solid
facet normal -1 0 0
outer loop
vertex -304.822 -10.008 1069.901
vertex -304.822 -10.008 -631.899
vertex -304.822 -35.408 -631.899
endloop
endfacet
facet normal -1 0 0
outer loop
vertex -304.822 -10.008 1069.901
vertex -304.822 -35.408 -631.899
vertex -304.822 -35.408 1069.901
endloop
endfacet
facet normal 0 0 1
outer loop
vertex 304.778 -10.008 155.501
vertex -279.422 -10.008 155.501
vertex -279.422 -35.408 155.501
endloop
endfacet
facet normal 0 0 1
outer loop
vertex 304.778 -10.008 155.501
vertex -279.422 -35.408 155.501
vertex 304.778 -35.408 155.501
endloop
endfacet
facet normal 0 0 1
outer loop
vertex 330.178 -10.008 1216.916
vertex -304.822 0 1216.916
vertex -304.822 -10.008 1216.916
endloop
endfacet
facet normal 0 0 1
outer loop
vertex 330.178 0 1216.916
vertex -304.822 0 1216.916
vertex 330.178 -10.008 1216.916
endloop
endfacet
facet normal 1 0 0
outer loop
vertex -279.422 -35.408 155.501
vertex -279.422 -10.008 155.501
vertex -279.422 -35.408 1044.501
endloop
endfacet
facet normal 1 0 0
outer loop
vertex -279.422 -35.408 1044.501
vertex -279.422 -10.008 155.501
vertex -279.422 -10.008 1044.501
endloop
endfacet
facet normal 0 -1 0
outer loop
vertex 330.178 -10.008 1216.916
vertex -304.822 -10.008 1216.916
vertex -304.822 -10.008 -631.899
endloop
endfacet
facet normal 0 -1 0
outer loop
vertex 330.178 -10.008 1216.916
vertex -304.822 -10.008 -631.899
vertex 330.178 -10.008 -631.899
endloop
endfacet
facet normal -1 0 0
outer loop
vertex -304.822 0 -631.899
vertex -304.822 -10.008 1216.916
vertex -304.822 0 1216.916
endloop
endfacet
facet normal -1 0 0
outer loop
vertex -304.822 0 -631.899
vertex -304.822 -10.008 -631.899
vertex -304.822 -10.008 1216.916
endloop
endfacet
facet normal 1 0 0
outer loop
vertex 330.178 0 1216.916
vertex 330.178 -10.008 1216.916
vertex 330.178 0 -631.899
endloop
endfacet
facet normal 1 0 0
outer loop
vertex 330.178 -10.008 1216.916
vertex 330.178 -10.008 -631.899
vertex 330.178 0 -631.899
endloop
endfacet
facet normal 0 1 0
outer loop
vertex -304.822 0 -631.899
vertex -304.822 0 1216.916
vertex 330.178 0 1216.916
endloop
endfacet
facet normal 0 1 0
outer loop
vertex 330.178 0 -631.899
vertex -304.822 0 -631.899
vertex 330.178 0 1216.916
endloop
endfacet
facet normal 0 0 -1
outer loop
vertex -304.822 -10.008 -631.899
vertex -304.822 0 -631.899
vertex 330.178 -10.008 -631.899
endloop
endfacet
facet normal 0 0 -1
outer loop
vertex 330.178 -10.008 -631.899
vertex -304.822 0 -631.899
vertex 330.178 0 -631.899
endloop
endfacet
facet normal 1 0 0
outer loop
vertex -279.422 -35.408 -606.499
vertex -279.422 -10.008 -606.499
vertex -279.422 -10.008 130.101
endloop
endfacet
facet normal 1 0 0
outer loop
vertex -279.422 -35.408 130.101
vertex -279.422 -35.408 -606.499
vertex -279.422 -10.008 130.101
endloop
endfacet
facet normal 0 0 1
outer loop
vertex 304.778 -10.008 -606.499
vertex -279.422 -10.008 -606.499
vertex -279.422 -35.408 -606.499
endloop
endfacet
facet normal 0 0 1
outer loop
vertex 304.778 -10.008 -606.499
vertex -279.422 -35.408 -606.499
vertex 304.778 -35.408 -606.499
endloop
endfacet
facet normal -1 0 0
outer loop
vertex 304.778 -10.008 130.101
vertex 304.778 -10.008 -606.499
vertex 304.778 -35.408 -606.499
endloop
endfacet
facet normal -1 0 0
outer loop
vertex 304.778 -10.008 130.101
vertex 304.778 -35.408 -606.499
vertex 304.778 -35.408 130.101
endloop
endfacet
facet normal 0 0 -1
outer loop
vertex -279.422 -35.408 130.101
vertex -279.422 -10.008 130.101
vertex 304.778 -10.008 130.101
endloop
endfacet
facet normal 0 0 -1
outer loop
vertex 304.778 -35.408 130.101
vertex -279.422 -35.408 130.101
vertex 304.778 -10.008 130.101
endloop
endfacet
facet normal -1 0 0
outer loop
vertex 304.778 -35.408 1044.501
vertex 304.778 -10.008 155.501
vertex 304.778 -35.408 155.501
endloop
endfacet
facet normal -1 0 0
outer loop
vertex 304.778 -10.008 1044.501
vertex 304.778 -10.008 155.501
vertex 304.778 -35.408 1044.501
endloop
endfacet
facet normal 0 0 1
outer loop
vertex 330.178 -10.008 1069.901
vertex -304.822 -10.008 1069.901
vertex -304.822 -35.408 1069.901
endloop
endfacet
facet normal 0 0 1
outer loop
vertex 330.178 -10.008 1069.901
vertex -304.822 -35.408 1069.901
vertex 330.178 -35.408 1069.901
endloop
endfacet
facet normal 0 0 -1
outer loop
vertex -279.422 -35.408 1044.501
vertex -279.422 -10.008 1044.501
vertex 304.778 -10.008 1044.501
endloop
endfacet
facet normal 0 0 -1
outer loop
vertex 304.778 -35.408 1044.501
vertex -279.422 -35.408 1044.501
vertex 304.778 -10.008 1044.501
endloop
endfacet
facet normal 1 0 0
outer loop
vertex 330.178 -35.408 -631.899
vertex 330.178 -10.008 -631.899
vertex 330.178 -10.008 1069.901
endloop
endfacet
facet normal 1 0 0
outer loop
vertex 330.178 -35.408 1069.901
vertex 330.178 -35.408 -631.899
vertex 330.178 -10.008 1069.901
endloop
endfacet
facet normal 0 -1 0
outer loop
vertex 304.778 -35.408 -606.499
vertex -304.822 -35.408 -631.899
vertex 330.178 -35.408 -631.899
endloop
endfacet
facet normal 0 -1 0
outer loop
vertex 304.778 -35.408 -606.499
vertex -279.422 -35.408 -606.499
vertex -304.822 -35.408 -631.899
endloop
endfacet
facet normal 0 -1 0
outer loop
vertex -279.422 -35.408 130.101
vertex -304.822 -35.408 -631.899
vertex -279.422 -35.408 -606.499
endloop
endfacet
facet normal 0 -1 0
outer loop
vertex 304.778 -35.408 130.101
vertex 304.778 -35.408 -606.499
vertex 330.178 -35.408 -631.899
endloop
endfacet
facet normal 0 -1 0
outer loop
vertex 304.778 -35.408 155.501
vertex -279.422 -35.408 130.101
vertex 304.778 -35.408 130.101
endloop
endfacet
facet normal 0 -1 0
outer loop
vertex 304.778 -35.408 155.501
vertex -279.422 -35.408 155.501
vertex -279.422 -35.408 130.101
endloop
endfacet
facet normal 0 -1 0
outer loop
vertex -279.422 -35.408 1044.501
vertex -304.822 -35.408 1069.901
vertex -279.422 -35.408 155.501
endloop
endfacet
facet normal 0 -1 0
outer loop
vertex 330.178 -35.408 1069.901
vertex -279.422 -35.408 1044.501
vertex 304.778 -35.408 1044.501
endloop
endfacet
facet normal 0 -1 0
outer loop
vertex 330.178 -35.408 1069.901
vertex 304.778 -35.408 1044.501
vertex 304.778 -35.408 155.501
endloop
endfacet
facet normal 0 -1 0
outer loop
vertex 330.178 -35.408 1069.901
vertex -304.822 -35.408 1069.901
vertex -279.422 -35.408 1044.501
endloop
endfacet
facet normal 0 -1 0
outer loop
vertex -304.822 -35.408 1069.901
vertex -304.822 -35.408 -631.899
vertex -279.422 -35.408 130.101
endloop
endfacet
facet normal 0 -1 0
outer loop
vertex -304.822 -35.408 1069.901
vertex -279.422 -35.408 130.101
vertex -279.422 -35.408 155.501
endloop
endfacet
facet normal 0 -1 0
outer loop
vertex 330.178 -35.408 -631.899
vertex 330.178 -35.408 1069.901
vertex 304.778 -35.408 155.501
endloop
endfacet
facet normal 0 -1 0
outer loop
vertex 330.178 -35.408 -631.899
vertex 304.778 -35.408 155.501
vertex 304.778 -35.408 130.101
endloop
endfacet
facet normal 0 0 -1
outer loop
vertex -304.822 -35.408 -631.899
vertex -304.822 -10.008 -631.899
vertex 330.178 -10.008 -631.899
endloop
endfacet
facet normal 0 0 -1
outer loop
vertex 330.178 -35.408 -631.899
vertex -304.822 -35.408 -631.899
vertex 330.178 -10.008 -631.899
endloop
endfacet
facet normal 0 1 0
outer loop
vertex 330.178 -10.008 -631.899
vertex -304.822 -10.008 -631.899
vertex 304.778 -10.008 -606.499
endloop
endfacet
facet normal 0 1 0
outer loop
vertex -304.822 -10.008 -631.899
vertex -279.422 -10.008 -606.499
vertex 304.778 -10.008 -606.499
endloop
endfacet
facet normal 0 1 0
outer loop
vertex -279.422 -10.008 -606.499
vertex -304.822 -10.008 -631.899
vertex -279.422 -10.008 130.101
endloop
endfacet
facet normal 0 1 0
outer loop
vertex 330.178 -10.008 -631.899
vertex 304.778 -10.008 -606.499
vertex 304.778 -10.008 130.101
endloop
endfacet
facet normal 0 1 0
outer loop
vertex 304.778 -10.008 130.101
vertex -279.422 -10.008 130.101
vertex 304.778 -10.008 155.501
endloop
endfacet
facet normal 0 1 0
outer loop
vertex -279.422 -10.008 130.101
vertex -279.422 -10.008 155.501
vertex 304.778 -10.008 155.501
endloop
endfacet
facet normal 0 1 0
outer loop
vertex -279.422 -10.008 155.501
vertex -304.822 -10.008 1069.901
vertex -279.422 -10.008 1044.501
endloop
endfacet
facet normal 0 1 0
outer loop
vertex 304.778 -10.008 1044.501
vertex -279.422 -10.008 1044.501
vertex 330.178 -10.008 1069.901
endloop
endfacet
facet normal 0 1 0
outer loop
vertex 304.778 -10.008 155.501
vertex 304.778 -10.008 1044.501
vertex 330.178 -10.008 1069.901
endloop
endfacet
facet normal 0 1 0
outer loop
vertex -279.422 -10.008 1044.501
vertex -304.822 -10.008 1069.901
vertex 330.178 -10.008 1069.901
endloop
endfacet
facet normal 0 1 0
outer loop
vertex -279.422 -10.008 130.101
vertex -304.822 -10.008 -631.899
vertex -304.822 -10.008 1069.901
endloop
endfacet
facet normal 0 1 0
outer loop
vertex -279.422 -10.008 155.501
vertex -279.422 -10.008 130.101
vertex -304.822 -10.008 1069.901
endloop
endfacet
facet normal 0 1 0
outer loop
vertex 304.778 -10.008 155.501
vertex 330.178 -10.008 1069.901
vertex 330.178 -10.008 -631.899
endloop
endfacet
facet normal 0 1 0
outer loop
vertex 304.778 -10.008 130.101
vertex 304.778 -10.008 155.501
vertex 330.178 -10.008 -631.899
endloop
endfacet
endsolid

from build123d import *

# Parameters (mm, degrees)
F0_W     = 635
F0_H     = 1701.8
F1_DEPTH = 10.0076
F2_W     = 635
F2_H     = 1701.8
F2_W_2   = 584.2
F2_H_2   = 736.6
F2_H_3   = 889
F3_DEPTH = 25.4
F4_W     = 635
F4_H     = 10.0076
F5_DEPTH = 147.0152


with BuildPart() as f1:
    # F0 (on Front) → F1 (new body)
    with BuildSketch(Plane.XZ):
        with Locations((12.6779675484, 219.000581247)):
            Rectangle(F0_W, F0_H)
    extrude(amount=F1_DEPTH)

    # F4 (on face) → F5 (join)
    with BuildSketch(Plane.XY.offset(1069.900581247)):
        with Locations((12.6779675484, -5.0038)):
            Rectangle(F4_W, F4_H)
    extrude(amount=F5_DEPTH)


with BuildPart() as f3:
    # F2 (on face) → F3 (new body)
    with BuildSketch(Plane.XZ.offset(10.0076)):
        with Locations((12.6779675484, 219.000581247)):
            Rectangle(F2_W, F2_H)
        with Locations((12.6779675484, -238.199418753)):
            Rectangle(F2_W_2, F2_H_2, mode=Mode.SUBTRACT)
        with Locations((12.6779675484, 600.000581247)):
            Rectangle(F2_W_2, F2_H_3, mode=Mode.SUBTRACT)
    extrude(amount=F3_DEPTH)


solid = Compound([f1.part, f3.part])
